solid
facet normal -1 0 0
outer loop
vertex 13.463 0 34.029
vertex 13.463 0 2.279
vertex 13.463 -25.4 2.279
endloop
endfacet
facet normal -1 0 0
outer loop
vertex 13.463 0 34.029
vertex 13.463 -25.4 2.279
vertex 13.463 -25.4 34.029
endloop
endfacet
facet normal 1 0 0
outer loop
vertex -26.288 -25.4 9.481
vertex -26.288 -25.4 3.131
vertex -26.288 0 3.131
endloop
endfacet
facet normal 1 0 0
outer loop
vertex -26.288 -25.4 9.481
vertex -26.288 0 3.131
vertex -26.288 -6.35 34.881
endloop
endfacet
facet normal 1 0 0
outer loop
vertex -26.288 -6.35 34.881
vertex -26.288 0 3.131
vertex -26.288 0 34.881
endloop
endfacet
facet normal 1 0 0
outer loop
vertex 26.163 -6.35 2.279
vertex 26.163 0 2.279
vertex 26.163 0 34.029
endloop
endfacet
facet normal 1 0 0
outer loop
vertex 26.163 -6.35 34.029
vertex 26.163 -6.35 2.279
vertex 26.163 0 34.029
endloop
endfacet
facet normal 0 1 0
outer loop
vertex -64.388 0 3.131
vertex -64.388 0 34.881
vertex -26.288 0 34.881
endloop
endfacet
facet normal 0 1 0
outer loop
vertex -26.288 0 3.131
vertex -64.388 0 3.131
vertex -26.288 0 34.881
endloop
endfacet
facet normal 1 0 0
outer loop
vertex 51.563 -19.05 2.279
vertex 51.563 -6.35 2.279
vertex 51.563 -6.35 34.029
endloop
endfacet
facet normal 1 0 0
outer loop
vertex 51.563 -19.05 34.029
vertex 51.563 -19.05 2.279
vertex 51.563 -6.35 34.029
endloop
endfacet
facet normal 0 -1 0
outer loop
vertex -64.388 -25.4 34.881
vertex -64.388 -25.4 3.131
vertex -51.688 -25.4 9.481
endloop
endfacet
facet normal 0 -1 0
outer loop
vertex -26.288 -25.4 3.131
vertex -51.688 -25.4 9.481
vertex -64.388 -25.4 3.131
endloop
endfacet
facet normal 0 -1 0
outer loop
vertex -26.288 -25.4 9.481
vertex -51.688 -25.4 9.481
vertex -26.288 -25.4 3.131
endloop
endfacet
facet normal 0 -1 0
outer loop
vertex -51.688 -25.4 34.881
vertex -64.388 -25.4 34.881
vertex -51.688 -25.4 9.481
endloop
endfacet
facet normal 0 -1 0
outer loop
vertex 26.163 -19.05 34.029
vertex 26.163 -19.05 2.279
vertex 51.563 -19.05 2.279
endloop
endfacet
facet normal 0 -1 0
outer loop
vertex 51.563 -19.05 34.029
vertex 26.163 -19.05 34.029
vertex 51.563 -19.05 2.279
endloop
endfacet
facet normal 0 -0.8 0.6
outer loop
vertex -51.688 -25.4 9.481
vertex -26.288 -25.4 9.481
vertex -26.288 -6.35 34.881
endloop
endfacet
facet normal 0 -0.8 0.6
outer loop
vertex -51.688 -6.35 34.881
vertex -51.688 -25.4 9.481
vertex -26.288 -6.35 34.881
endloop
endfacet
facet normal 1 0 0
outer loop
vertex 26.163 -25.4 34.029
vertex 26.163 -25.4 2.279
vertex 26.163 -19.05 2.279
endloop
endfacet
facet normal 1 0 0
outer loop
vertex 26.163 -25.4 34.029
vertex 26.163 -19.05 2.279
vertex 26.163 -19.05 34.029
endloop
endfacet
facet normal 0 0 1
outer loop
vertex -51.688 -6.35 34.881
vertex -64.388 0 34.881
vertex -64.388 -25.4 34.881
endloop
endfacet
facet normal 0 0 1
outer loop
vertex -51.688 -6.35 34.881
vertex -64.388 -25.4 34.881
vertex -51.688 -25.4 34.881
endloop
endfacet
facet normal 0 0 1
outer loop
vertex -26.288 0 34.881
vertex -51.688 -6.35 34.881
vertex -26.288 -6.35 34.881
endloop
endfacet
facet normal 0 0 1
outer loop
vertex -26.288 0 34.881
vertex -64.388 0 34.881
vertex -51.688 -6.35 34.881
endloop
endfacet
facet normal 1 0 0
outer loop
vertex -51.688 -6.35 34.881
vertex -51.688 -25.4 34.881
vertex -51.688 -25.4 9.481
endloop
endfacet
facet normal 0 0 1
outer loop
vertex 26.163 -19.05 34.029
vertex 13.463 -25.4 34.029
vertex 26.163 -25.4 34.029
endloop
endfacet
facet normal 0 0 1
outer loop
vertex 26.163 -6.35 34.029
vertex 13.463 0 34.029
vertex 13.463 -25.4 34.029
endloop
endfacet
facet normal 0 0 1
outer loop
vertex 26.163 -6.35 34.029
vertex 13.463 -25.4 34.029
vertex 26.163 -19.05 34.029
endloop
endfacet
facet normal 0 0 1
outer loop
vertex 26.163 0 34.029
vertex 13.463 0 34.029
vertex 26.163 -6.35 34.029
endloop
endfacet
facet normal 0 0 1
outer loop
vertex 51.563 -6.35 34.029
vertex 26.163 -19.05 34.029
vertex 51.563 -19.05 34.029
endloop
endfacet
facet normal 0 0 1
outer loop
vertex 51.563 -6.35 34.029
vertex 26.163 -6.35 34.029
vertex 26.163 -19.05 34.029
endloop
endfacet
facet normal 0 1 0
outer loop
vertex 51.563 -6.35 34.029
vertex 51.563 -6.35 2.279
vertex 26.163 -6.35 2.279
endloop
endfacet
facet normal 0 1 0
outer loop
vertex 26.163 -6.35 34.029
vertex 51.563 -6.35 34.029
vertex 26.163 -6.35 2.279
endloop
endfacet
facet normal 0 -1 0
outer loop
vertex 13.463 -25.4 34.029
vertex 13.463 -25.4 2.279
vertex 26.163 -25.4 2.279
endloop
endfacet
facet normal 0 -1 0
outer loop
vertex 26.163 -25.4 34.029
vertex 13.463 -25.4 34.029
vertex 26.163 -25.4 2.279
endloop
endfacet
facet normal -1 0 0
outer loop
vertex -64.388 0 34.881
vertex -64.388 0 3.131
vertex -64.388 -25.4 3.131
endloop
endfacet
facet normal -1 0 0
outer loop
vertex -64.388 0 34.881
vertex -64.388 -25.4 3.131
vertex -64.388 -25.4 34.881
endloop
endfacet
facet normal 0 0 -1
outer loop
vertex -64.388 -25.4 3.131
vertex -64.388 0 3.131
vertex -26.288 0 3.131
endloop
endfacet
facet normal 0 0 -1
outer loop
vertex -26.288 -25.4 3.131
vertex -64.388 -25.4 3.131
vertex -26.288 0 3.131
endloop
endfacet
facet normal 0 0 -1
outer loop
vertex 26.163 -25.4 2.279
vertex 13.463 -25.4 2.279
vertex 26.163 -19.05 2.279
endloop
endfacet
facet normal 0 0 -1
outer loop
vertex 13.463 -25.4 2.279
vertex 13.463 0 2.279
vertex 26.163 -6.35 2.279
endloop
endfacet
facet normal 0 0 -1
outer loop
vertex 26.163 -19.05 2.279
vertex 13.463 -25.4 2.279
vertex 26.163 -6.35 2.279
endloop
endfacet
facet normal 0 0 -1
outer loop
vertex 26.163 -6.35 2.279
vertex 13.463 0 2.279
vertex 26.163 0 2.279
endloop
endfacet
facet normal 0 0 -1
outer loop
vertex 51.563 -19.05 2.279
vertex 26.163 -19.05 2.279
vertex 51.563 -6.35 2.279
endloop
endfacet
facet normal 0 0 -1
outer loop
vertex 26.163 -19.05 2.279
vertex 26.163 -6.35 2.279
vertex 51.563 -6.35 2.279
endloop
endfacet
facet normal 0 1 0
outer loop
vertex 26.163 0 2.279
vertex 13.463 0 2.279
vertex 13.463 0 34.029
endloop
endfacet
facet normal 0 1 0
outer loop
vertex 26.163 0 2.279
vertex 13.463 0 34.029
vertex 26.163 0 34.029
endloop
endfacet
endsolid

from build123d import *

# Parameters (mm, degrees)
F0_W     = 38.1
F0_H     = 31.75
F1_DEPTH = 25.4
F3_DEPTH = 25.4
F4_W     = 38.1
F4_H     = 31.75
F5_DEPTH = 25.4
F6_W     = 25.4
F6_H     = 31.75
F7_DEPTH = 6.35
F8_W     = 25.4
F8_H     = 31.75
F9_DEPTH = 6.35


with BuildPart() as f1:
    # F0 (on Front) → F1 (new body)
    with BuildSketch(Plane.XZ):
        with Locations((-45.338315, 19.005952)):
            Rectangle(F0_W, F0_H)
    extrude(amount=F1_DEPTH)

    # F2 (on face) → F3 (cut)
    with BuildSketch(Plane.YZ.offset(-26.288315)):
        Polygon((-25.4, 9.480952), (-6.35, 34.880952), (-25.4, 34.880952), align=None)
    extrude(amount=-F3_DEPTH, mode=Mode.SUBTRACT)


with BuildPart() as f5:
    # F4 (on Front) → F5 (new body)
    with BuildSketch(Plane.XZ):
        with Locations((32.512898, 18.153821)):
            Rectangle(F4_W, F4_H)
    extrude(amount=F5_DEPTH)

    # F6 (on face) → F7 (cut)
    with BuildSketch(Plane.XZ.offset(25.4)):
        with Locations((38.862898, 18.153821)):
            Rectangle(F6_W, F6_H)
    extrude(amount=-F7_DEPTH, mode=Mode.SUBTRACT)

    # F8 (on face) → F9 (cut)
    with BuildSketch(Plane(origin=(0, 0, 0), x_dir=(-1, 0, 0), z_dir=(0, 1, 0))):
        with Locations((-38.862898, 18.153821)):
            Rectangle(F8_W, F8_H)
    extrude(amount=-F9_DEPTH, mode=Mode.SUBTRACT)


solid = Compound([f1.part, f5.part])
